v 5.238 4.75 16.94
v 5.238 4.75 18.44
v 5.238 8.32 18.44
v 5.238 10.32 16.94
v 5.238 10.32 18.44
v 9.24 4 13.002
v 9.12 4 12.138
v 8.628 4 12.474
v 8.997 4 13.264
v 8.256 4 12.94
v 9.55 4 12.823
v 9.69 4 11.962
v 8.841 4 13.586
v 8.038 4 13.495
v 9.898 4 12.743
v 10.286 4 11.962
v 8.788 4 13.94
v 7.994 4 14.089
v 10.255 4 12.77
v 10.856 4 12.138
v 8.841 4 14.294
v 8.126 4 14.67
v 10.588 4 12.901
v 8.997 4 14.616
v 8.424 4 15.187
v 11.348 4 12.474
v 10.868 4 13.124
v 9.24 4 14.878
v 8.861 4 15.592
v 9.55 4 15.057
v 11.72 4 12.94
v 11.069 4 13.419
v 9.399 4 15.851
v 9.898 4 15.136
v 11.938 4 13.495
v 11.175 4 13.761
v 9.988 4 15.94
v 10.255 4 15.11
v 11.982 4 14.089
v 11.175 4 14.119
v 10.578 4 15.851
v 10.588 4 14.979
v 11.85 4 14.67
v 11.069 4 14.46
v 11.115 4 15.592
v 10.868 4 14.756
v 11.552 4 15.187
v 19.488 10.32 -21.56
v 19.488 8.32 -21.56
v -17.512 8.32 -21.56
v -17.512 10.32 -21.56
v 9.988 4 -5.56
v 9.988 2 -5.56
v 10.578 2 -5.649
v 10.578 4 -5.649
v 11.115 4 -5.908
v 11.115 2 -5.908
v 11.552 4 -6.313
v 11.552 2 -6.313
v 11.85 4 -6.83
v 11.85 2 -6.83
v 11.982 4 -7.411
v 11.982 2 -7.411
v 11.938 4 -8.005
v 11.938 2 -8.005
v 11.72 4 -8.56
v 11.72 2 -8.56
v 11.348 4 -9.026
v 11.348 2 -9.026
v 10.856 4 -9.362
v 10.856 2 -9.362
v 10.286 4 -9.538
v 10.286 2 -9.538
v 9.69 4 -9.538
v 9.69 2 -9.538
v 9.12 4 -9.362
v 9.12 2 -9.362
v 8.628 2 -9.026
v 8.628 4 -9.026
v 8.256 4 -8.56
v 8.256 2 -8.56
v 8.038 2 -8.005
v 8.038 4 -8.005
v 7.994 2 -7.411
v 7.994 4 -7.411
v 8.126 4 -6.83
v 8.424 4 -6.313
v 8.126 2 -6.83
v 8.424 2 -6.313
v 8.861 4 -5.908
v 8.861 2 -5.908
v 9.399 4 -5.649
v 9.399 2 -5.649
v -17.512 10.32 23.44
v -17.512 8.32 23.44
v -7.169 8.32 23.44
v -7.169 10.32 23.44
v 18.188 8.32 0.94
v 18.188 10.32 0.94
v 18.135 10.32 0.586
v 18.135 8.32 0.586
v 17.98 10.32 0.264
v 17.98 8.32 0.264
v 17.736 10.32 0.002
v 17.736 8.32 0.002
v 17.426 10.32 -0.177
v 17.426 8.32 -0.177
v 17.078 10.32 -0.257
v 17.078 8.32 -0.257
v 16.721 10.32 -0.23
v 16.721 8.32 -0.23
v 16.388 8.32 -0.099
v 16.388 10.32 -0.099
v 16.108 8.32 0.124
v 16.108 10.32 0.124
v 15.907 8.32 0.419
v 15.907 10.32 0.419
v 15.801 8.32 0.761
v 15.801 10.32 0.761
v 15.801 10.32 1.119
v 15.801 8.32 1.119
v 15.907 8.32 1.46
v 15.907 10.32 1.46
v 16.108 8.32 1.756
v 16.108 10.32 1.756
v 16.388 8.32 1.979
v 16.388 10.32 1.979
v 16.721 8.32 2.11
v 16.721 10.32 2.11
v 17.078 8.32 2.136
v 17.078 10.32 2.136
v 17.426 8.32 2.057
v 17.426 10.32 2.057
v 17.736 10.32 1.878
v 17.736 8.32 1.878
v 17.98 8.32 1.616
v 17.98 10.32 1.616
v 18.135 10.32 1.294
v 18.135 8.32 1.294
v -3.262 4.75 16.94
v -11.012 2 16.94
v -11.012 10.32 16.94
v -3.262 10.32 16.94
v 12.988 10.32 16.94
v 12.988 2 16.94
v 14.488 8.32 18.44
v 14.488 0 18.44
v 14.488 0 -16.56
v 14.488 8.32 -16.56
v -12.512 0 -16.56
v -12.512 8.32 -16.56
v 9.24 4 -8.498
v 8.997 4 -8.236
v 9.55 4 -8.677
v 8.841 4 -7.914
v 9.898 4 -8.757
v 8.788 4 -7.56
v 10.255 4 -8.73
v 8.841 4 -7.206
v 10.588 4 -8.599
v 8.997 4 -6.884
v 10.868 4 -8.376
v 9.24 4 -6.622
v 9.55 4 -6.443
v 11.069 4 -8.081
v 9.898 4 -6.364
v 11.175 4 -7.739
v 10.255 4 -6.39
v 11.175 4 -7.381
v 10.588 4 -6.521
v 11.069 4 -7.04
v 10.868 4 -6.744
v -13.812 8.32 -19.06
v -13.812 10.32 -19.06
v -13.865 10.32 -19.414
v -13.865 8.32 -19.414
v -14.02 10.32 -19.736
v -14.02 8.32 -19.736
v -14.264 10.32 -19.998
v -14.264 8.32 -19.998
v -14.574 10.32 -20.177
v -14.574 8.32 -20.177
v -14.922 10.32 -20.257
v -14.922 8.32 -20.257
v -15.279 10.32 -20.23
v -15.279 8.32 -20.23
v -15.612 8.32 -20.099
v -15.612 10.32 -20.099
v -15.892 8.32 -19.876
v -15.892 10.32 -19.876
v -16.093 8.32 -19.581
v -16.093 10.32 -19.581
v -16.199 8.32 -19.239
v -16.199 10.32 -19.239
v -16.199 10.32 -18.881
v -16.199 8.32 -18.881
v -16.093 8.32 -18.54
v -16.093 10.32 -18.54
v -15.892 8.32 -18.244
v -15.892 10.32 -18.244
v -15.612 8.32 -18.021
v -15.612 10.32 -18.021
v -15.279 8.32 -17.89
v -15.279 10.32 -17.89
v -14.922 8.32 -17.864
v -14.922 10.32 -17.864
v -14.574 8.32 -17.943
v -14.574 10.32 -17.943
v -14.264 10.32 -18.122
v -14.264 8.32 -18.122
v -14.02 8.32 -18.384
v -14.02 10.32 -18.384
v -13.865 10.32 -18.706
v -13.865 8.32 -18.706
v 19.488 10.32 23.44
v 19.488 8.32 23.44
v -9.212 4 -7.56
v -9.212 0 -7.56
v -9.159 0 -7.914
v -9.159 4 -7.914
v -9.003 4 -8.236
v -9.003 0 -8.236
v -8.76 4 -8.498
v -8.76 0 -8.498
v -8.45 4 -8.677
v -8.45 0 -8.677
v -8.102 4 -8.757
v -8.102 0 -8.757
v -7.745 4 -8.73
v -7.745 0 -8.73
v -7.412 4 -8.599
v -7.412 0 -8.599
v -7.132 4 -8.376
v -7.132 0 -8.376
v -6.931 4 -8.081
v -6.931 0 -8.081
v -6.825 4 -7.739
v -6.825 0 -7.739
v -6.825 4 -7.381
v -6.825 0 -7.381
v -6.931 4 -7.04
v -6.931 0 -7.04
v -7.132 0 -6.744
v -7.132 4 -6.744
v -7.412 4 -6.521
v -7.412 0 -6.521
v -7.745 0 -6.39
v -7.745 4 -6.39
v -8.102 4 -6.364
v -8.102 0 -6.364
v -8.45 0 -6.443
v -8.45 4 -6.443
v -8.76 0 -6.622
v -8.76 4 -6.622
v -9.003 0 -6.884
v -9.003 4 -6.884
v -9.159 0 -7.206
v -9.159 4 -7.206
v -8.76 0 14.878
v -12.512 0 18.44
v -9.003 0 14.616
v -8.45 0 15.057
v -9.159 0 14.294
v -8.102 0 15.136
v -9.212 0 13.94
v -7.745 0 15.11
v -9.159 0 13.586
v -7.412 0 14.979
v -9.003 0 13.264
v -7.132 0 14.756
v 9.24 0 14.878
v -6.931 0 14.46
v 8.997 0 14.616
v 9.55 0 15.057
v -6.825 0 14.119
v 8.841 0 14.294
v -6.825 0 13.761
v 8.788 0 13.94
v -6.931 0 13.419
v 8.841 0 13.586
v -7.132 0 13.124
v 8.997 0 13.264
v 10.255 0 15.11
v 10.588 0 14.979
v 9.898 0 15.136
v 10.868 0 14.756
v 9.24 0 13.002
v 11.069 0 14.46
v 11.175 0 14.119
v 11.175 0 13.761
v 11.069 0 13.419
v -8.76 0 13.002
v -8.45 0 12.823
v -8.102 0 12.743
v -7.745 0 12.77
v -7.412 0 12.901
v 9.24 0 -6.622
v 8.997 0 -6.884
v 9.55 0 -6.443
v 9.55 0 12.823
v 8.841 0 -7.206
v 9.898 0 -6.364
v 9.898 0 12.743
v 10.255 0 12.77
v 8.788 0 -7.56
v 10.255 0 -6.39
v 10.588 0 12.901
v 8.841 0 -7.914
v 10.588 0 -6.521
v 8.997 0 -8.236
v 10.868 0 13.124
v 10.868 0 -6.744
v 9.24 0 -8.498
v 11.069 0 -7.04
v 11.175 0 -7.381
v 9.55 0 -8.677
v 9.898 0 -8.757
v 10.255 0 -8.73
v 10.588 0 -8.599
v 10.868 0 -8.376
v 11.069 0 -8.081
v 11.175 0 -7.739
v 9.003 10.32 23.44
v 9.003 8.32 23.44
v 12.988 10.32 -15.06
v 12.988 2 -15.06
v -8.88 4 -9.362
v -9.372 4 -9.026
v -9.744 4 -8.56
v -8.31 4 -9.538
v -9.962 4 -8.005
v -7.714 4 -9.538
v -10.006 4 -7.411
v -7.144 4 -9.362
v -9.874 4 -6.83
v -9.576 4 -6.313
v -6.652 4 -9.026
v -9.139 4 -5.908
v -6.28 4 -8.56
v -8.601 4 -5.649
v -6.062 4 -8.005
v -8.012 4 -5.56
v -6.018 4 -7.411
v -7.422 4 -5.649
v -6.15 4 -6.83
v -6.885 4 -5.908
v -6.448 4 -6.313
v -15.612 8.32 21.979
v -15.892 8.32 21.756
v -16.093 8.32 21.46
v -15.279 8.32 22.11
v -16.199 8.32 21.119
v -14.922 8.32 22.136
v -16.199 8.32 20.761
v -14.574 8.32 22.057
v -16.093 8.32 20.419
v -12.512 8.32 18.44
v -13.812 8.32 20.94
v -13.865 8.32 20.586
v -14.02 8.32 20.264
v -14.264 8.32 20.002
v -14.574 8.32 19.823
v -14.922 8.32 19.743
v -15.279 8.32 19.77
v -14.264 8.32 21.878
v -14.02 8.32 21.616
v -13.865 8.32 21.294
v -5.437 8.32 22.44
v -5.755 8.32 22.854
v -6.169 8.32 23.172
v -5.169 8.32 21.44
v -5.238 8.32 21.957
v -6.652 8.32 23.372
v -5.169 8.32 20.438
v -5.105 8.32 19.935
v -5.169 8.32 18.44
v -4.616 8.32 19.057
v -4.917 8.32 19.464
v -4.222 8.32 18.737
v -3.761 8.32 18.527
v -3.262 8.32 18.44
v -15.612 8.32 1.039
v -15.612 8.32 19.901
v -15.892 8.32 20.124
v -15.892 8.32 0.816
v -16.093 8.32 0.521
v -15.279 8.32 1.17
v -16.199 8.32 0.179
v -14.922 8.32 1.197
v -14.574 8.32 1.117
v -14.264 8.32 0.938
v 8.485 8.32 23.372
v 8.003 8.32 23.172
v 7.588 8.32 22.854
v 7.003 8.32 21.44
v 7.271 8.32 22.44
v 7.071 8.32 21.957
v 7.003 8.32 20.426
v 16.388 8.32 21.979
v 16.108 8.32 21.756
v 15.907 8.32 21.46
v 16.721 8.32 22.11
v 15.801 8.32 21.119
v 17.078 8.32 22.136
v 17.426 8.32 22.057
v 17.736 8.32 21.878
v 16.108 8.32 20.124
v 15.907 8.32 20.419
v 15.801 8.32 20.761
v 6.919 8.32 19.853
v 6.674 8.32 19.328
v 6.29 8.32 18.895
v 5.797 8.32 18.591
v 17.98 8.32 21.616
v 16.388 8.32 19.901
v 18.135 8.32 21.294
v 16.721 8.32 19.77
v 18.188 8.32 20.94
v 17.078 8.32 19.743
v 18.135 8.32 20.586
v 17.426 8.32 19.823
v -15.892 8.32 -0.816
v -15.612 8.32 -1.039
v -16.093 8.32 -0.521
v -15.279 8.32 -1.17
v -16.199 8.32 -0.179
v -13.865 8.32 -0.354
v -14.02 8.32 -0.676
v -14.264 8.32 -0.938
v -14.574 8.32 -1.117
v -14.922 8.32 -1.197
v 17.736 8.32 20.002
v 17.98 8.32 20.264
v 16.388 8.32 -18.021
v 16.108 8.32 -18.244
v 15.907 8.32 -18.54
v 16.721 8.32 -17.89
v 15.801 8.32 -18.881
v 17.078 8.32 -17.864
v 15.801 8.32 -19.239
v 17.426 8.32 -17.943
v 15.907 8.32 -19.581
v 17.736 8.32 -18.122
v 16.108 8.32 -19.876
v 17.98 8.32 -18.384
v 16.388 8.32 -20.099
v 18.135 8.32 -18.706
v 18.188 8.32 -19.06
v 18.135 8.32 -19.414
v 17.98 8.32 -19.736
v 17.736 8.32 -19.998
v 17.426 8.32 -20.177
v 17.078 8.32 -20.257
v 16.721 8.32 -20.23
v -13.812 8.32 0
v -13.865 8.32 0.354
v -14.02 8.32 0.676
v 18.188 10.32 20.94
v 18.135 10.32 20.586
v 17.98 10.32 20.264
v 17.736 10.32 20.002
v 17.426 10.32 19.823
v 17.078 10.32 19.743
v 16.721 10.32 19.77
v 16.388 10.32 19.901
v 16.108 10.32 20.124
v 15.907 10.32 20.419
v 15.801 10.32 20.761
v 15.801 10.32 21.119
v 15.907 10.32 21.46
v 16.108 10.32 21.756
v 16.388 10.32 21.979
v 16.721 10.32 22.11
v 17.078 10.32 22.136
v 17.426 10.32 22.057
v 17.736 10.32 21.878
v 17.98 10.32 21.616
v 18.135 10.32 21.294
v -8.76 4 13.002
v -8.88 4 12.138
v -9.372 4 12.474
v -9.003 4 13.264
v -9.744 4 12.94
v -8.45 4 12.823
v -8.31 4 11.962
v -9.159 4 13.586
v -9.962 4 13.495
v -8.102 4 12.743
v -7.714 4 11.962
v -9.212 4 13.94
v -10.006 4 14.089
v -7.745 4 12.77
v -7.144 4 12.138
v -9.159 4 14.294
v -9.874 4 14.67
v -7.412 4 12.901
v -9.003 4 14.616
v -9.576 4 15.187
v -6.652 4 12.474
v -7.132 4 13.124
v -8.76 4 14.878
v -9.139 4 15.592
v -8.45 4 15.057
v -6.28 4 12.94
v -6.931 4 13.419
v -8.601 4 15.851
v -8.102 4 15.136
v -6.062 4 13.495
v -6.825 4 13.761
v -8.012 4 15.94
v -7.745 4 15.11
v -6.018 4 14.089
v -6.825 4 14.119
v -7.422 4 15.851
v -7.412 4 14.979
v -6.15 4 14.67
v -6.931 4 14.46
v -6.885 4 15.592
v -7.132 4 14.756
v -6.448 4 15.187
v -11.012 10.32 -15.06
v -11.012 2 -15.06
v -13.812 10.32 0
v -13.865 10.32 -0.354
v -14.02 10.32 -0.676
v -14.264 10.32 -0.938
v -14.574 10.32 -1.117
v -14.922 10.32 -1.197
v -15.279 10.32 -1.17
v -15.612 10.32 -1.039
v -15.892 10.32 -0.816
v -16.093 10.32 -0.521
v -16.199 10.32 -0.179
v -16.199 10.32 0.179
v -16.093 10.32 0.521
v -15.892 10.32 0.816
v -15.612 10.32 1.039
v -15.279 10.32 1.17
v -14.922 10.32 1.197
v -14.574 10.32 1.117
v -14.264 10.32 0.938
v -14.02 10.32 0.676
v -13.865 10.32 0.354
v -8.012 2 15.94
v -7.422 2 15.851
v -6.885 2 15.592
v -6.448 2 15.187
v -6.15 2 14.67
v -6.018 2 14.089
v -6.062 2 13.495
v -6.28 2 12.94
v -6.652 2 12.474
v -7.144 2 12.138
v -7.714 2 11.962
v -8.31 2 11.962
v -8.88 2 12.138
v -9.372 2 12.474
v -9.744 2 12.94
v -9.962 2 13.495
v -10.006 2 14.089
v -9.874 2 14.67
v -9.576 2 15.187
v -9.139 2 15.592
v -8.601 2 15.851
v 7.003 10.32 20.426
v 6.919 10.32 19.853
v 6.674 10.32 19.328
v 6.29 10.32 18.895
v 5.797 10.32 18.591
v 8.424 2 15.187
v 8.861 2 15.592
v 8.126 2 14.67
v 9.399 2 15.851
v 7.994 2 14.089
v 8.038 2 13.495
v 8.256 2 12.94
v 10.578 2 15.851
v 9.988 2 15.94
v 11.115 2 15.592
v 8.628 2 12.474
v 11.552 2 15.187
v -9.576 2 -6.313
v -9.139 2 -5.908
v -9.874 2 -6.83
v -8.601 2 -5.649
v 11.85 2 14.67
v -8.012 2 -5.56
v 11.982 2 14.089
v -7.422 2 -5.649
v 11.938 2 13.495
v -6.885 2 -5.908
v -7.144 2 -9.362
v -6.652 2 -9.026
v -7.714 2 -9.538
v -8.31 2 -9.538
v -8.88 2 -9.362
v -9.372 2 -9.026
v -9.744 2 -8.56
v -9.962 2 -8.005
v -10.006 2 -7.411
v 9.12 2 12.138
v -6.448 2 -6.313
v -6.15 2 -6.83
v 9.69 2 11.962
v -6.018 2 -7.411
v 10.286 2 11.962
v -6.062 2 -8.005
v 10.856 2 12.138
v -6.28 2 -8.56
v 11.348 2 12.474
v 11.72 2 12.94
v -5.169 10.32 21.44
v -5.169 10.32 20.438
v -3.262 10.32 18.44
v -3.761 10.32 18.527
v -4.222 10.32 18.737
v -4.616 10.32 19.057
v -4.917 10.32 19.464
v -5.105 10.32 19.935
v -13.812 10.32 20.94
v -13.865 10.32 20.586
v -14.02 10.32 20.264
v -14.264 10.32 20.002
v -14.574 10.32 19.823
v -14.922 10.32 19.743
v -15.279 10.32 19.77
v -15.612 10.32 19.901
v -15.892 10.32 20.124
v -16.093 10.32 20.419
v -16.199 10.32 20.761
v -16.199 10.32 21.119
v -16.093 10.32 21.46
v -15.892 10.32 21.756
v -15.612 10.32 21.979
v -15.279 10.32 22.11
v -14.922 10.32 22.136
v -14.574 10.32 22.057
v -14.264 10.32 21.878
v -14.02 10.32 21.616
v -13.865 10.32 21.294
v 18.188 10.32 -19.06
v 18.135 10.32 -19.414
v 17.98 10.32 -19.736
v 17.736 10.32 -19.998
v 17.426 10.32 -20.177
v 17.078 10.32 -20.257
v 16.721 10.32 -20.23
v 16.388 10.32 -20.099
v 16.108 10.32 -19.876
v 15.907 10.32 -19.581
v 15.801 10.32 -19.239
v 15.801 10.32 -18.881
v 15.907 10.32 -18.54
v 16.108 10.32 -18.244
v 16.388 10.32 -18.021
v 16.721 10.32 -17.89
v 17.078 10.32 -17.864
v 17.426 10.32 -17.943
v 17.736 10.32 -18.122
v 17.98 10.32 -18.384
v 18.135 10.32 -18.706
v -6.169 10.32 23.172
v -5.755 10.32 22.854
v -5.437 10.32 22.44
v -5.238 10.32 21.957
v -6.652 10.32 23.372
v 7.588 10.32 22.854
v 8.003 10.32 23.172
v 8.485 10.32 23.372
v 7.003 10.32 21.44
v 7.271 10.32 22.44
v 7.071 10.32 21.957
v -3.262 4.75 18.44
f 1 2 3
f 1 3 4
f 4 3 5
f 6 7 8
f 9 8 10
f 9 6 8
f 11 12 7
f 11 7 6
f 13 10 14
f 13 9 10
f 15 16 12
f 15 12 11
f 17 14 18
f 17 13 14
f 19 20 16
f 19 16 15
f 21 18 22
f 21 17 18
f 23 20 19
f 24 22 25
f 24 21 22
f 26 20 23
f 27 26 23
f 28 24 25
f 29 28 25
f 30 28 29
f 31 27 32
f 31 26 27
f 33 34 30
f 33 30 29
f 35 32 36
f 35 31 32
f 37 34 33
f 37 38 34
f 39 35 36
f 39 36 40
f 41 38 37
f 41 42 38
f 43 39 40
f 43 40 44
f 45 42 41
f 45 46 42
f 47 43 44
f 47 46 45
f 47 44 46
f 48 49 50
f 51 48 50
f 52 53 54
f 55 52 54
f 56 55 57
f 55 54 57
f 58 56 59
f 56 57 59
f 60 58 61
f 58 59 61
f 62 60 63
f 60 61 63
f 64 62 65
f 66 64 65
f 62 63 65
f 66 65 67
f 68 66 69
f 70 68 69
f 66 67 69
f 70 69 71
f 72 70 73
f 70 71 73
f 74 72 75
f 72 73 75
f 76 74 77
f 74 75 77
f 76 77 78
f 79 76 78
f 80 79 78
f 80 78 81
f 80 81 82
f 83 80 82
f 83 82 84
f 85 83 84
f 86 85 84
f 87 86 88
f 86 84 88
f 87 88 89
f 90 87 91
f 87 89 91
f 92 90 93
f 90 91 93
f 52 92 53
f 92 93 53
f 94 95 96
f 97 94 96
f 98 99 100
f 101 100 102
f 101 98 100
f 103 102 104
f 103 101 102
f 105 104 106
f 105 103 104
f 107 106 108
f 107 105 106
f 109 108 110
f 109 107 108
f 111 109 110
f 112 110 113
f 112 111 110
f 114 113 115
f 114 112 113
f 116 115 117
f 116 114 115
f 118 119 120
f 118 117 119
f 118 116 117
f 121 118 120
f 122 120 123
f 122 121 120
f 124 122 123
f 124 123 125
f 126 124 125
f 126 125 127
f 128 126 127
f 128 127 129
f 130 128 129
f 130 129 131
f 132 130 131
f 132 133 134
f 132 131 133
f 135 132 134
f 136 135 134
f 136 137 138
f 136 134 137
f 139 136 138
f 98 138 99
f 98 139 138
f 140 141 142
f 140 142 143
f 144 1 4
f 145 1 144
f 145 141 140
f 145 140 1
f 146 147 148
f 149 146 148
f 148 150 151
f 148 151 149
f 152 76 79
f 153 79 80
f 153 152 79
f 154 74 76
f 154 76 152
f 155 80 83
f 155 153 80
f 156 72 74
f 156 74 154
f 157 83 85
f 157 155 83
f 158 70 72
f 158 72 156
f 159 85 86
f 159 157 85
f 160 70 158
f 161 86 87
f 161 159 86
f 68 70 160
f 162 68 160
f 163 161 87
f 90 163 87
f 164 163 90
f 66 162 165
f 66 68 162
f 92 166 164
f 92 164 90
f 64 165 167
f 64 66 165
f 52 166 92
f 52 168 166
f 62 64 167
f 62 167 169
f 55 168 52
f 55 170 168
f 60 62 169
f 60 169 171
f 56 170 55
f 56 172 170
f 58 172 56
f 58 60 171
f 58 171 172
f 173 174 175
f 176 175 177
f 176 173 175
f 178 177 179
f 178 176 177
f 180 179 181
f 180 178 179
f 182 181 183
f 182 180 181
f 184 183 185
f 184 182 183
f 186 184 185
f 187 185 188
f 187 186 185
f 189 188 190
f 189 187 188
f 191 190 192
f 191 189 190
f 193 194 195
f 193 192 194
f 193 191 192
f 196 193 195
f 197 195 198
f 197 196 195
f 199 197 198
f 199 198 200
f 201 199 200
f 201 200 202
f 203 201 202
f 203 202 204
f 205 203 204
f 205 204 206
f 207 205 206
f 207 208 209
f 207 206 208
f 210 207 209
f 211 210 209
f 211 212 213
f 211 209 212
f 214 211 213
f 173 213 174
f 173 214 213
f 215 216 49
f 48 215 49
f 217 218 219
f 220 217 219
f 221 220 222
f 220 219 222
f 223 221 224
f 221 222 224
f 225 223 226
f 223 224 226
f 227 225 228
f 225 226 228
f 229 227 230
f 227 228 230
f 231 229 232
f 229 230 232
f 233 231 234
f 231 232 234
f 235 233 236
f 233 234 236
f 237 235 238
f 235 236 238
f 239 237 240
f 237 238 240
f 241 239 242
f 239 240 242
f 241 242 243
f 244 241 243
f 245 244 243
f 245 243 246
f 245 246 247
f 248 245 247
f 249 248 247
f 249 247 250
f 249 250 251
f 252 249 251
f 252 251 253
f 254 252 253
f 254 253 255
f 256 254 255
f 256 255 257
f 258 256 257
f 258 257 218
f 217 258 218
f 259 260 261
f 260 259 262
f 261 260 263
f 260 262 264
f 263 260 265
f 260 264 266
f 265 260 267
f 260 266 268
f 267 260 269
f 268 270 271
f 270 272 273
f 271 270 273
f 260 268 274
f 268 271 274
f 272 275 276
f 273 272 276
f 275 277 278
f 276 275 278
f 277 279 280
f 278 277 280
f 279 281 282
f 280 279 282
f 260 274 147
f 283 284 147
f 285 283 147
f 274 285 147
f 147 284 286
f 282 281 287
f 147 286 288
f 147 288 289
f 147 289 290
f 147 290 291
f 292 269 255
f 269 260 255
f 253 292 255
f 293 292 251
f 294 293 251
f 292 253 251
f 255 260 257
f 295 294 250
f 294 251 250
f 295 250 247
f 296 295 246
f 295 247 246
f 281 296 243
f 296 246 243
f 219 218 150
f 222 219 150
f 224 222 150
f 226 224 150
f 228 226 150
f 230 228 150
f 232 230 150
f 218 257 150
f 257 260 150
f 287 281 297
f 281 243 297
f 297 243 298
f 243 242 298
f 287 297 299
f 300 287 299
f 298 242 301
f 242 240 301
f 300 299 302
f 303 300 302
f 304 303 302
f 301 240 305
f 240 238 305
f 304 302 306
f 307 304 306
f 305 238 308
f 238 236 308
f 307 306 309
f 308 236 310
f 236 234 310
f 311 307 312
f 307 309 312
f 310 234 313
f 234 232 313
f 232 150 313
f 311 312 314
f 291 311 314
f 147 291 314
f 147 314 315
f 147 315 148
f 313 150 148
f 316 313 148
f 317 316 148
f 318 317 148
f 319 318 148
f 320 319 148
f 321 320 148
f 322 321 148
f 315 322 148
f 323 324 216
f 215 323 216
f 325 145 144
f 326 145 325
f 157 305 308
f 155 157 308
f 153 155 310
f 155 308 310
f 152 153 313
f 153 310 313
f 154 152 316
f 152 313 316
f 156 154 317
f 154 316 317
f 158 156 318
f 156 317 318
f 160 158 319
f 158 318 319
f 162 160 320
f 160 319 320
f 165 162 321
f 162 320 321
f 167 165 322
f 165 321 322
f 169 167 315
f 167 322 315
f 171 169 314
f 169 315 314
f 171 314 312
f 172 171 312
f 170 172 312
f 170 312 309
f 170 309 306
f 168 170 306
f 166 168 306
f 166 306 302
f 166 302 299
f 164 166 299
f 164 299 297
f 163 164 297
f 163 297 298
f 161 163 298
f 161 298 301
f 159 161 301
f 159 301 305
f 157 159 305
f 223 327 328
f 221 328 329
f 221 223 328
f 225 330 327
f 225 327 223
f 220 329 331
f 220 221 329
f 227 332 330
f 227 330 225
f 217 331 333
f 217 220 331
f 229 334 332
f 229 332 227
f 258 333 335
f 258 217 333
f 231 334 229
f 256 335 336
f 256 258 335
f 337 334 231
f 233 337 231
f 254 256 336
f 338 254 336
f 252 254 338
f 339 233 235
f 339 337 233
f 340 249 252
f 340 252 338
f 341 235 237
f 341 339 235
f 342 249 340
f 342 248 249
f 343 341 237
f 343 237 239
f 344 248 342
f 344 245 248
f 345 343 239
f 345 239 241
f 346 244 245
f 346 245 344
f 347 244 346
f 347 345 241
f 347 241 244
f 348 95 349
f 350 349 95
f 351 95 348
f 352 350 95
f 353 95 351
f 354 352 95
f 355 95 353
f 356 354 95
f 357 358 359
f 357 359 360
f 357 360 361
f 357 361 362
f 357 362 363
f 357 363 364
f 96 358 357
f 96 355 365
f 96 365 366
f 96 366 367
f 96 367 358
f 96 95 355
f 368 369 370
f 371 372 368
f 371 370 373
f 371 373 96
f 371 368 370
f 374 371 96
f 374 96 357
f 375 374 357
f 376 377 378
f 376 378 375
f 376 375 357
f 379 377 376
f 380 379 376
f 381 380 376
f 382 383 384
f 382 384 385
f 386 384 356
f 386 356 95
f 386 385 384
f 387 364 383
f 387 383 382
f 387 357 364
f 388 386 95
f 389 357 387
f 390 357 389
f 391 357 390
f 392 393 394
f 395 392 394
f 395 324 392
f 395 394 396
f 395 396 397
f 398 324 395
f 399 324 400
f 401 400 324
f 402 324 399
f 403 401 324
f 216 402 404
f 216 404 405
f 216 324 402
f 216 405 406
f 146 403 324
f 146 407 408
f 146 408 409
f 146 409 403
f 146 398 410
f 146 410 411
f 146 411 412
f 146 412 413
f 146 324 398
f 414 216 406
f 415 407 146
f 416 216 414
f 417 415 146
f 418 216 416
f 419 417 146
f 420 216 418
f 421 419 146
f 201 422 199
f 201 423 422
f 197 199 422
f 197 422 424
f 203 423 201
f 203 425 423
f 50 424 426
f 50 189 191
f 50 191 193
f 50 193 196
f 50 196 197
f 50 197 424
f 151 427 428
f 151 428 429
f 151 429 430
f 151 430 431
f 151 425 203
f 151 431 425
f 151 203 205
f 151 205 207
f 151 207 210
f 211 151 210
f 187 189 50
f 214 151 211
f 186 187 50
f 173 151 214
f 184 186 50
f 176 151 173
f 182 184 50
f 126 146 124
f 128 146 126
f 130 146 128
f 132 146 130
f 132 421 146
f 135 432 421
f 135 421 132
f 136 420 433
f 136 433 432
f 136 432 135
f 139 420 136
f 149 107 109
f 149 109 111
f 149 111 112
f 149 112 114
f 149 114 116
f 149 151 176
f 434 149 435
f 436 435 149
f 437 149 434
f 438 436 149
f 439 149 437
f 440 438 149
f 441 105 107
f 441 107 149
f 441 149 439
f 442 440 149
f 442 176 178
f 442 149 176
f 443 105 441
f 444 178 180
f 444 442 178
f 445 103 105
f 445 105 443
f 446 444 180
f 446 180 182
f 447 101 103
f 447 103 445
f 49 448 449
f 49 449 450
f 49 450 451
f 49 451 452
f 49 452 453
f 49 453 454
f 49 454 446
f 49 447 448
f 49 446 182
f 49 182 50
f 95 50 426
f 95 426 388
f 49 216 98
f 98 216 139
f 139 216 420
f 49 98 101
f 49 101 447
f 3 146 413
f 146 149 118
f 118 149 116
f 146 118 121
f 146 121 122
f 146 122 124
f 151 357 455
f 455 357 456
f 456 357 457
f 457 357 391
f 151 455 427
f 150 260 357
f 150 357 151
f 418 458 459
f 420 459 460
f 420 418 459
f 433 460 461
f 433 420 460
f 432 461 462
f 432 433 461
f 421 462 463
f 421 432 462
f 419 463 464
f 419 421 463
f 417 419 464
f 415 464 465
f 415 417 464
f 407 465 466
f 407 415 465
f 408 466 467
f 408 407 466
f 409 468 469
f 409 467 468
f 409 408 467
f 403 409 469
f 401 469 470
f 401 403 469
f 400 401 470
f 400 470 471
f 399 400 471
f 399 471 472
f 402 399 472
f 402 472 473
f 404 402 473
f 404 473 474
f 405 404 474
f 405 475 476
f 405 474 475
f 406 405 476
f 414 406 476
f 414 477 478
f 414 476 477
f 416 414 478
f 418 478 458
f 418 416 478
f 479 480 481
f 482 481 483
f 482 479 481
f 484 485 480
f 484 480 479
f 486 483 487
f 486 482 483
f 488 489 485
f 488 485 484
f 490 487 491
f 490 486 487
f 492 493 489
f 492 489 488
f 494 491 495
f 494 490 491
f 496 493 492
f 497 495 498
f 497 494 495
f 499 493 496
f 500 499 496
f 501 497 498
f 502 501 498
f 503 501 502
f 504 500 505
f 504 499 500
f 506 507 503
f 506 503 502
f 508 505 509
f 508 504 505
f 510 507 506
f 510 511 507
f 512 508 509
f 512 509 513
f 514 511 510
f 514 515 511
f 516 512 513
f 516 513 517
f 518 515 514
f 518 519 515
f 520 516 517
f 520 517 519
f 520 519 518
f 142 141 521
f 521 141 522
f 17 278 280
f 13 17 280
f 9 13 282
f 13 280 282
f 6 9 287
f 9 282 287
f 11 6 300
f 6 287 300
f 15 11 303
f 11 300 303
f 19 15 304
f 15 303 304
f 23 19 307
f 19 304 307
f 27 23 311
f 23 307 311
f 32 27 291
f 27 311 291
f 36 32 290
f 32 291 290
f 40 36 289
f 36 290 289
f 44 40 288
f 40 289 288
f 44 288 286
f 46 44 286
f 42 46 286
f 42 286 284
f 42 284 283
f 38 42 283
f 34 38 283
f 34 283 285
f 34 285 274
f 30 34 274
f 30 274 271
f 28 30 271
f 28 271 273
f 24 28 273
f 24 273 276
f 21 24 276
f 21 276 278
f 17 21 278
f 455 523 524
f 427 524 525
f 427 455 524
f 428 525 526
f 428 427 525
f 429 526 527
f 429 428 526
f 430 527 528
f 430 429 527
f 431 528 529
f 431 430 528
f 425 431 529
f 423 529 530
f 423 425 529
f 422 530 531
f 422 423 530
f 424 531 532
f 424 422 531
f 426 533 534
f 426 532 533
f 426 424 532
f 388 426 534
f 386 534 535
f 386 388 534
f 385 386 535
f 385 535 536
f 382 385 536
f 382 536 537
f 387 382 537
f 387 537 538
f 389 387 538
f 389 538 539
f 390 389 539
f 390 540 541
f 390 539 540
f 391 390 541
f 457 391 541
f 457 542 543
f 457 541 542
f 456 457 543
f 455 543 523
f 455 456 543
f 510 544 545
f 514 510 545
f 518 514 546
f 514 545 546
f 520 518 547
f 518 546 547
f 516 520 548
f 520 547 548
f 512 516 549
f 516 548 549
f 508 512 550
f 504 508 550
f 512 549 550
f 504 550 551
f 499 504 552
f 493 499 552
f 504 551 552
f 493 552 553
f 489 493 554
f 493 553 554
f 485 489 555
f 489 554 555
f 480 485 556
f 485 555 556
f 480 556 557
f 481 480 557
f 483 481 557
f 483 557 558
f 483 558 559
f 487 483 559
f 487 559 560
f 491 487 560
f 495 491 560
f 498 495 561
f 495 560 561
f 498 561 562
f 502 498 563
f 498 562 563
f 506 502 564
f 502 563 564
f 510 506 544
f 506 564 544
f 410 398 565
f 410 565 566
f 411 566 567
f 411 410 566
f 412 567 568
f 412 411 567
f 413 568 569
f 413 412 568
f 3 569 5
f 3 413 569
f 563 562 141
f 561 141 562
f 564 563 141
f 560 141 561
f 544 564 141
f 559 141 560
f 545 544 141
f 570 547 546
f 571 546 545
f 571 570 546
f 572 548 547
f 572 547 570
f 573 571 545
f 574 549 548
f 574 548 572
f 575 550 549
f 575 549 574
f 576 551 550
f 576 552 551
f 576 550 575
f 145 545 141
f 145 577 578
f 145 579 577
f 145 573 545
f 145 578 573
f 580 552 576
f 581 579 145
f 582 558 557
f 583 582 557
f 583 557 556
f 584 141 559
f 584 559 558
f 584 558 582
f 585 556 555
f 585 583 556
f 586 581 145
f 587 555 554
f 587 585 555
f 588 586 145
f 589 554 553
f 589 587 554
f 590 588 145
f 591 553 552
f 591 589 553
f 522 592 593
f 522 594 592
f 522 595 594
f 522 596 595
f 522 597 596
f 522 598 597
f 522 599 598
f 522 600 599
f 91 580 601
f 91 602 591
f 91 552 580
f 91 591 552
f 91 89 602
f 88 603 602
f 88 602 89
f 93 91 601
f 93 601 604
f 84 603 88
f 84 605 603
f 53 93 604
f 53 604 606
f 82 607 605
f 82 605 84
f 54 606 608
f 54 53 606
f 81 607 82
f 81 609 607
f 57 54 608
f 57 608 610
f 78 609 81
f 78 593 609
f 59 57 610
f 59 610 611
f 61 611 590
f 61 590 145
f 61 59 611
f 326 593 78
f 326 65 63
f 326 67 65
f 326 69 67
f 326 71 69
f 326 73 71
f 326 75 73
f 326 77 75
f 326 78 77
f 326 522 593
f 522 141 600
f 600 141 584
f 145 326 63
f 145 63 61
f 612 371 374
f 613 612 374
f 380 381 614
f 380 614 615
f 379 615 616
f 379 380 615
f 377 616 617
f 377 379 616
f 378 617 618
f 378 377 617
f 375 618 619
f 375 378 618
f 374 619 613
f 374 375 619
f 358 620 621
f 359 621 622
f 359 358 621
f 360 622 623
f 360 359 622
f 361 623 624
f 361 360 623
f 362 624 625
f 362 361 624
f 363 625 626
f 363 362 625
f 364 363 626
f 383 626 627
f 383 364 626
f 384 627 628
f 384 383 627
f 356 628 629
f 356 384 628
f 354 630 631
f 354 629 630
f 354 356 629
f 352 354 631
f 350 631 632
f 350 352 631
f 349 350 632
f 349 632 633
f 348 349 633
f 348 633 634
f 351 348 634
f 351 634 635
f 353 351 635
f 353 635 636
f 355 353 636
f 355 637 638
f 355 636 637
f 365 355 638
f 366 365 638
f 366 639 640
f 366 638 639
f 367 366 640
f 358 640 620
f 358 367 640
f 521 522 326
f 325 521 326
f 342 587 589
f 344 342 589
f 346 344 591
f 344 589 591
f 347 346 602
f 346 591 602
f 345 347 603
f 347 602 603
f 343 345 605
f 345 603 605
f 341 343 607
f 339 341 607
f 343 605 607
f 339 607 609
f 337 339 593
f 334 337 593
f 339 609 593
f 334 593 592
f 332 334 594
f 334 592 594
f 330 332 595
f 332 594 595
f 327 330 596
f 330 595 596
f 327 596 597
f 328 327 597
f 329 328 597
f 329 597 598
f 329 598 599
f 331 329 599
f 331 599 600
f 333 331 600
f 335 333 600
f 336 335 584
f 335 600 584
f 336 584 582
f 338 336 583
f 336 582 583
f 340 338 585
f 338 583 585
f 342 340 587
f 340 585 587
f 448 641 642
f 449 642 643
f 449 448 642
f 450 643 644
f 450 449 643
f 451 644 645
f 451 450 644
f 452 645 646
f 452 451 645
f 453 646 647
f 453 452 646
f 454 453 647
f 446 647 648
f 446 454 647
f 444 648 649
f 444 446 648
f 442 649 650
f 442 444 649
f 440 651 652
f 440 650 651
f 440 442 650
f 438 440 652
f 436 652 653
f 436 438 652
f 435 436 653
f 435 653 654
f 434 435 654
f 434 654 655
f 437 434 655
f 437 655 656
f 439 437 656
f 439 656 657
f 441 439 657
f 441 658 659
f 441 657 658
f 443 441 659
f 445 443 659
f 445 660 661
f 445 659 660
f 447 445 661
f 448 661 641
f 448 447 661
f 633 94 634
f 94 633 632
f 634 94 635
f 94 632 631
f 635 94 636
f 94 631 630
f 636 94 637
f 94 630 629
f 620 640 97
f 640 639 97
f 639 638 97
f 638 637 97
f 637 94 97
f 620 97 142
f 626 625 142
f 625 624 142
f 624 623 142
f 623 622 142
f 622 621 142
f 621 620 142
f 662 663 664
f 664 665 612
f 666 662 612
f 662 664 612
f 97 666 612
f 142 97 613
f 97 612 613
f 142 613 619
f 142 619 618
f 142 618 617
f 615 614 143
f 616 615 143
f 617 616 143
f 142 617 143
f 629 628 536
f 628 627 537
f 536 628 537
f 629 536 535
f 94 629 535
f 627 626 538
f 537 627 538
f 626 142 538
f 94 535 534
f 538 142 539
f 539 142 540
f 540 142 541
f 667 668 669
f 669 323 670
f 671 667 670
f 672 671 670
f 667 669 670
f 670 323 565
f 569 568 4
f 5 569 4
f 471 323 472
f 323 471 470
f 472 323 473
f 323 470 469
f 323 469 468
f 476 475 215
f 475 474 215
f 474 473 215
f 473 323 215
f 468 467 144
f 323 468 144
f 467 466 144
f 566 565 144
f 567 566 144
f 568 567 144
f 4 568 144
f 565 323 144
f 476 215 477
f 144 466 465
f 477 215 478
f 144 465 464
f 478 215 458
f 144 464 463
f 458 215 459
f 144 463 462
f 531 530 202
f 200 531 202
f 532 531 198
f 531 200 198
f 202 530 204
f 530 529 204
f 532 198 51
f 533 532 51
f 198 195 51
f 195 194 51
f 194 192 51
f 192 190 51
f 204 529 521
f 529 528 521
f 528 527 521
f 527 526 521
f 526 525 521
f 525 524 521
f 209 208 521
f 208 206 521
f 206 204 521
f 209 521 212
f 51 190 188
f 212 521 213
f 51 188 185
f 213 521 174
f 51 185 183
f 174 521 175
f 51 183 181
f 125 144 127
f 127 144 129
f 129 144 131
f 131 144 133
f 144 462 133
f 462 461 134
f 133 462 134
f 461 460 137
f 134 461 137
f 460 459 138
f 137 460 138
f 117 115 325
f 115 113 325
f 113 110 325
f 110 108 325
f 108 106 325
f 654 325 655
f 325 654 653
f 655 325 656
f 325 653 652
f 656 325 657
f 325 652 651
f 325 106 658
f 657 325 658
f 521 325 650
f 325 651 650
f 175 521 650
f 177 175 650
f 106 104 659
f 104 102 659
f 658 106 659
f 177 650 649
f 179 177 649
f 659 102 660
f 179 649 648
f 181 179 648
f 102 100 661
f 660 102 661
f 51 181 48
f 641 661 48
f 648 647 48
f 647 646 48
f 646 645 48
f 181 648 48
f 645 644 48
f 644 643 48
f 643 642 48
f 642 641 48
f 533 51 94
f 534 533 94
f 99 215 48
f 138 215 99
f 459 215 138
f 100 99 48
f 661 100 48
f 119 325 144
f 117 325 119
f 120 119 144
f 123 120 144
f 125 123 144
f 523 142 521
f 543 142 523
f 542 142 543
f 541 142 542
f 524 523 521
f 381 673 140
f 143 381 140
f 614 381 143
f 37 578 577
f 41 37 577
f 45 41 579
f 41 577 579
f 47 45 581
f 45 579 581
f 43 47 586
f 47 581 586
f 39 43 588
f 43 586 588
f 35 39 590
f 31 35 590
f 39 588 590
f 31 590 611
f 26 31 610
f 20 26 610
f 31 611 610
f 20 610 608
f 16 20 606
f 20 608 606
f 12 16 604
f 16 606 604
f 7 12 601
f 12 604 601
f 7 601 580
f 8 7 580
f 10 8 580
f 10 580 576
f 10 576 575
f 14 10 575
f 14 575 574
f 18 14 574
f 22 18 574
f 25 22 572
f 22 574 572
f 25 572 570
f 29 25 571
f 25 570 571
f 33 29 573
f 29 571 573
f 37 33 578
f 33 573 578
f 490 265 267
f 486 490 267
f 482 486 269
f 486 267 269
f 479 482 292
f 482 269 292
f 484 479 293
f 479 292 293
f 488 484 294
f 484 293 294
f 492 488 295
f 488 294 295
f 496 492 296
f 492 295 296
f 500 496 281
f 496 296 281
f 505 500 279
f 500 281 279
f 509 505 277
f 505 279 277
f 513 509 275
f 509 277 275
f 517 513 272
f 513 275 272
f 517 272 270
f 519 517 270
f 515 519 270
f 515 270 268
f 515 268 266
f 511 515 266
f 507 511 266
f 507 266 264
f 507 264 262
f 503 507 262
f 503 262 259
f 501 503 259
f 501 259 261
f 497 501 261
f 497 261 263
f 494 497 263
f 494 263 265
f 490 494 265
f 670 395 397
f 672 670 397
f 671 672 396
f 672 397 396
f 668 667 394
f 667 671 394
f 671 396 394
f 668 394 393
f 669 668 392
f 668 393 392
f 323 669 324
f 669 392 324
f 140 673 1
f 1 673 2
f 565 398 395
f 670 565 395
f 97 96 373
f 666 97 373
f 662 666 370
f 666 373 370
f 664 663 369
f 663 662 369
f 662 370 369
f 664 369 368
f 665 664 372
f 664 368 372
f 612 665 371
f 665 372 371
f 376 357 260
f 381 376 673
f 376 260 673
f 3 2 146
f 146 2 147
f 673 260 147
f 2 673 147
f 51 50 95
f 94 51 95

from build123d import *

# Parameters (mm, degrees)
SKETCH1_W                      = 27
SKETCH1_H                      = 35
SKETCH1_R                      = 1.113712744
SKETCH1_R_2                    = 1.000106258
SKETCH1_R_3                    = 1.174626552
SKETCH1_R_4                    = 1.19920455
SKETCH1_W_2                    = 8.5
SKETCH1_H_2                    = 2.12
BOSS_EXTRUDE1_DEPTH            = 2
SKETCH3_R                      = 2
BOSS_EXTRUDE2_DEPTH            = 2
M2_CLEARANCE_HOLE1_D           = 2.4
LPATTERN1_COUNT                = 2
LPATTERN1_PITCH                = 18
LPATTERN1_COUNT_DIR2           = 2
LPATTERN1_PITCH_DIR2           = 21.5
SKETCH6_W                      = 27
SKETCH6_H                      = 35
SKETCH6_W_2                    = 24
SKETCH6_H_2                    = 32
BOSS_EXTRUDE4_DEPTH            = 8.32
CUT_EXTRUDE1_REACH             = 41.261
SKETCH7_W                      = 8.5
SKETCH7_H                      = 5.57
CUT_EXTRUDE1_DIRECTION_2_DEPTH = 40.260756636
BOSS_EXTRUDE5_START            = -4
BOSS_EXTRUDE5_OUTLINE_R        = 1.2
BOSS_EXTRUDE5_DEPTH            = 2
M2_CLEARANCE_HOLE2_D           = 2.4
FILLET1_R                      = 2


with BuildPart() as part:
    # Sketch1 → Boss-Extrude1 (new body)
    # profile 1 of 8: a face of its own
    with BuildSketch(Plane(origin=(0, 0, 0), x_dir=(1, 0, 0), z_dir=(0, 1, 0))):
        with Locations((0.988085162, -0.939800033)):
            Rectangle(SKETCH1_W, SKETCH1_H)
        Polygon((-10.011914838, -15.939800033), (-10.011914838, 14.060199967), (11.988085162, 14.060199967), (11.988085162, -15.939800033), (5.238085162, -15.939800033), (5.238085162, -18.059800033), (-3.261914838, -18.059800033), (-3.261914838, -15.939800033), align=None, mode=Mode.SUBTRACT)
    # profile 2 of 8: a face of its own
    with BuildSketch(Plane(origin=(0, 0, 0), x_dir=(1, 0, 0), z_dir=(0, 1, 0))):
        Polygon((11.988085162, 14.060199967), (-10.011914838, 14.060199967), (-10.011914838, -15.939800033), (-3.261914838, -15.939800033), (-3.261914838, -13.819800033), (5.238085162, -13.819800033), (5.238085162, -15.939800033), (11.988085162, -15.939800033), align=None)
        with Locations((-8.011914838, -13.939800033)):
            Circle(SKETCH1_R, mode=Mode.SUBTRACT)
        with Locations((7.931487186, -14.291814947)):
            Circle(SKETCH1_R_2, mode=Mode.SUBTRACT)
        with Locations((-8.011914838, 7.560199967)):
            Circle(SKETCH1_R_3, mode=Mode.SUBTRACT)
        with Locations((9.988085162, 7.560199967)):
            Circle(SKETCH1_R_4, mode=Mode.SUBTRACT)
    # profile 3 of 8: a face of its own
    with BuildSketch(Plane(origin=(0, 0, 0), x_dir=(1, 0, 0), z_dir=(0, 1, 0))):
        with Locations((-8.011914838, 7.560199967)):
            Circle(SKETCH1_R_3)
    # profile 4 of 8: a face of its own
    with BuildSketch(Plane(origin=(0, 0, 0), x_dir=(1, 0, 0), z_dir=(0, 1, 0))):
        with Locations((9.988085162, 7.560199967)):
            Circle(SKETCH1_R_4)
    # profile 5 of 8: a face of its own
    with BuildSketch(Plane(origin=(0, 0, 0), x_dir=(1, 0, 0), z_dir=(0, 1, 0))):
        with Locations((7.931487186, -14.291814947)):
            Circle(SKETCH1_R_2)
    # profile 6 of 8: a face of its own
    with BuildSketch(Plane(origin=(0, 0, 0), x_dir=(1, 0, 0), z_dir=(0, 1, 0))):
        with Locations((0.988085162, -16.999800033)):
            Rectangle(SKETCH1_W_2, SKETCH1_H_2)
    # profile 7 of 8: a face of its own
    with BuildSketch(Plane(origin=(0, 0, 0), x_dir=(1, 0, 0), z_dir=(0, 1, 0))):
        with Locations((0.988085162, -14.879800033)):
            Rectangle(SKETCH1_W_2, SKETCH1_H_2)
    # profile 8 of 8: a face of its own
    with BuildSketch(Plane(origin=(0, 0, 0), x_dir=(1, 0, 0), z_dir=(0, 1, 0))):
        with Locations((-8.011914838, -13.939800033)):
            Circle(SKETCH1_R)
    extrude(amount=BOSS_EXTRUDE1_DEPTH)

    # Sketch3 → Boss-Extrude2 (add)
    with BuildSketch(Plane(origin=(0, 2, 0), x_dir=(1, 0, 0), z_dir=(0, 1, 0))):
        with Locations(Location((-8.011914838, 7.560199967, 0), (0, 0, 270))):
            Circle(SKETCH3_R)
    boss_extrude2 = extrude(amount=BOSS_EXTRUDE2_DEPTH)

    # M2 Clearance Hole1 (through all)
    with Locations(Plane(origin=(0, 4, 0), x_dir=(1, 0, 0), z_dir=(0, 1, 0))):
        with Locations((-8.011914838, 7.560199967)):
            m2_clearance_hole1 = Hole(M2_CLEARANCE_HOLE1_D / 2)

    # LPattern1: Boss-Extrude2, M2 Clearance Hole1 2 × 2
    with Locations(*[(i * LPATTERN1_PITCH, 0, j * LPATTERN1_PITCH_DIR2) for i in range(LPATTERN1_COUNT) for j in range(LPATTERN1_COUNT_DIR2) if (i, j) != (0, 0)]):
        add(boss_extrude2)
        add(m2_clearance_hole1, mode=Mode.SUBTRACT)

    # Sketch6 → Boss-Extrude4 (add)
    with BuildSketch(Plane(origin=(0, 2, 0), x_dir=(1, 0, 0), z_dir=(0, 1, 0))):
        with Locations((0.988085162, -0.939800033)):
            Rectangle(SKETCH6_W, SKETCH6_H)
        with Locations((0.988085162, -0.939800033)):
            Rectangle(SKETCH6_W_2, SKETCH6_H_2, mode=Mode.SUBTRACT)
    extrude(amount=BOSS_EXTRUDE4_DEPTH)

    # Sketch7 → Cut-Extrude1 (cut, up to next)
    with BuildSketch(Plane.XY.offset(18.439800033), mode=Mode.PRIVATE) as cut_extrude1_sk1:
        with Locations((0.988085162, 7.535)):
            Rectangle(SKETCH7_W, SKETCH7_H)
    cut_extrude1_tool1 = extrude(cut_extrude1_sk1.sketch, amount=-CUT_EXTRUDE1_REACH, mode=Mode.PRIVATE) & part.part
    add(cut_extrude1_tool1.solids().sort_by_distance((0.988085, 7.535, 18.4398))[0], mode=Mode.SUBTRACT)

    # Sketch7 → Cut-Extrude1 direction 2 (cut)
    with BuildSketch(Plane.XY.offset(18.439800033)):
        with Locations((0.988085162, 7.535)):
            Rectangle(SKETCH7_W, SKETCH7_H)
    extrude(amount=CUT_EXTRUDE1_DIRECTION_2_DEPTH, mode=Mode.SUBTRACT)

    # Boss-Extrude5: read off the stored shape, not the designer's step
    # Boss-Extrude5 outline → Boss-Extrude5 (add)
    with BuildSketch(Plane(origin=(0, 12.32, 0), x_dir=(1, 0, 0), z_dir=(0, 1, 0)).offset(BOSS_EXTRUDE5_START)):
        Polygon((-5.169409796, -23.439799853), (-5.169409796, -18.439799853), (-12.511914838, -18.439800033), (-12.511914838, 16.560199967), (14.488085162, 16.560199967), (14.488085162, -18.439800033), (7.002600417, -18.439800033), (7.002600417, -23.439799853), (19.488084722, -23.439799853), (19.488084722, 21.560200147), (-17.511915278, 21.560200147), (-17.511915278, -23.439799853), align=None)
        with Locations((-15.011915278, -20.939799853)):
            Circle(BOSS_EXTRUDE5_OUTLINE_R, mode=Mode.SUBTRACT)
        with Locations((16.988084722, -20.939799853)):
            Circle(BOSS_EXTRUDE5_OUTLINE_R, mode=Mode.SUBTRACT)
        with Locations((-15.011915278, 0)):
            Circle(BOSS_EXTRUDE5_OUTLINE_R, mode=Mode.SUBTRACT)
        with Locations((-15.011915278, 19.060200147)):
            Circle(BOSS_EXTRUDE5_OUTLINE_R, mode=Mode.SUBTRACT)
        with Locations((16.988084722, -0.939799853)):
            Circle(BOSS_EXTRUDE5_OUTLINE_R, mode=Mode.SUBTRACT)
        with Locations((16.988084722, 19.060200147)):
            Circle(BOSS_EXTRUDE5_OUTLINE_R, mode=Mode.SUBTRACT)
    extrude(amount=BOSS_EXTRUDE5_DEPTH)

    # M2 Clearance Hole2 (through all)
    with Locations(Plane(origin=(0, 10.32, 0), x_dir=(1, 0, 0), z_dir=(0, 1, 0))):
        with Locations((-15.011915278, 19.060200147), (-15.011915278, 0), (-15.011915278, -20.939799853), (16.988084722, -20.939799853), (16.988084722, -0.939799853), (16.988084722, 19.060200147)):
            Hole(M2_CLEARANCE_HOLE2_D / 2)

    # Fillet1
    # the kernel refuses this fillet: 2 mm, written as the material it adds along each edge
    with BuildSketch(Plane(origin=(7.002600417, 8.32, 18.439800033), x_dir=(0, 0, 1), z_dir=(0, 1, 0))) as fillet1_piece_1:
        with BuildLine():
            CenterArc((1.98608835, -2), FILLET1_R, 90, 83.23817367)
            Line((0, -1.764515255), (-0.039721767, -1.75980556))
            ThreePointArc((-0.039721767, -1.75980556), (-0.04, -0.882257627), (-0.04, 0))
            Line((-0.04, 0), (0, 0.04))
            Line((0, 0.04), (1.98608835, 0.04))
            Line((1.98608835, 0.04), (1.98608835, 0))
        make_face()
    extrude(amount=2)
    # the kernel refuses this fillet: 2 mm, written as the material it adds along each edge
    with BuildSketch(Plane(origin=(-5.169409796, 8.32, 18.439799853), x_dir=(0, 0, 1), z_dir=(0, 1, 0))) as fillet1_2_piece_1:
        with BuildLine():
            CenterArc((1.997859739, 2), FILLET1_R, 182.651020031, 87.348979969)
            Line((1.8e-07, 1.907494958), (-0.039957011, 1.905644857))
            ThreePointArc((-0.039957011, 1.905644857), (-0.03999982, 0.953747479), (-0.04, 0))
            Line((-0.04, 0), (0, -0.04))
            Line((0, -0.04), (1.997859739, -0.04))
            Line((1.997859739, -0.04), (1.997859739, 0))
        make_face()
    extrude(amount=2)
    # the kernel refuses this fillet: 2 mm, written as the material it takes off along each edge
    with BuildSketch(Plane(origin=(-5.169409796, 3.32, 23.439799853), x_dir=(0, 0, -1), z_dir=(0, 1, 0))) as fillet1_3_piece_1:
        with BuildLine():
            CenterArc((FILLET1_R, FILLET1_R), FILLET1_R, 180, 90)
            Line((0, FILLET1_R), (-FILLET1_R * 0.02, FILLET1_R))
            Line((-FILLET1_R * 0.02, FILLET1_R), (-FILLET1_R * 0.02, -FILLET1_R * 0.02))
            Line((-FILLET1_R * 0.02, -FILLET1_R * 0.02), (FILLET1_R, -FILLET1_R * 0.02))
            Line((FILLET1_R, -FILLET1_R * 0.02), (FILLET1_R, 0))
        make_face()
    extrude(amount=12, mode=Mode.SUBTRACT)
    # the kernel refuses this fillet: 2 mm, written as the material it takes off along each edge
    with BuildSketch(Plane(origin=(7.002600417, 3.32, 23.439799853), x_dir=(1, 0, 0), z_dir=(0, 1, 0))) as fillet1_4_piece_1:
        with BuildLine():
            CenterArc((FILLET1_R, FILLET1_R), FILLET1_R, 180, 90)
            Line((0, FILLET1_R), (-FILLET1_R * 0.02, FILLET1_R))
            Line((-FILLET1_R * 0.02, FILLET1_R), (-FILLET1_R * 0.02, -FILLET1_R * 0.02))
            Line((-FILLET1_R * 0.02, -FILLET1_R * 0.02), (FILLET1_R, -FILLET1_R * 0.02))
            Line((FILLET1_R, -FILLET1_R * 0.02), (FILLET1_R, 0))
        make_face()
    extrude(amount=12, mode=Mode.SUBTRACT)


solid = part.part
